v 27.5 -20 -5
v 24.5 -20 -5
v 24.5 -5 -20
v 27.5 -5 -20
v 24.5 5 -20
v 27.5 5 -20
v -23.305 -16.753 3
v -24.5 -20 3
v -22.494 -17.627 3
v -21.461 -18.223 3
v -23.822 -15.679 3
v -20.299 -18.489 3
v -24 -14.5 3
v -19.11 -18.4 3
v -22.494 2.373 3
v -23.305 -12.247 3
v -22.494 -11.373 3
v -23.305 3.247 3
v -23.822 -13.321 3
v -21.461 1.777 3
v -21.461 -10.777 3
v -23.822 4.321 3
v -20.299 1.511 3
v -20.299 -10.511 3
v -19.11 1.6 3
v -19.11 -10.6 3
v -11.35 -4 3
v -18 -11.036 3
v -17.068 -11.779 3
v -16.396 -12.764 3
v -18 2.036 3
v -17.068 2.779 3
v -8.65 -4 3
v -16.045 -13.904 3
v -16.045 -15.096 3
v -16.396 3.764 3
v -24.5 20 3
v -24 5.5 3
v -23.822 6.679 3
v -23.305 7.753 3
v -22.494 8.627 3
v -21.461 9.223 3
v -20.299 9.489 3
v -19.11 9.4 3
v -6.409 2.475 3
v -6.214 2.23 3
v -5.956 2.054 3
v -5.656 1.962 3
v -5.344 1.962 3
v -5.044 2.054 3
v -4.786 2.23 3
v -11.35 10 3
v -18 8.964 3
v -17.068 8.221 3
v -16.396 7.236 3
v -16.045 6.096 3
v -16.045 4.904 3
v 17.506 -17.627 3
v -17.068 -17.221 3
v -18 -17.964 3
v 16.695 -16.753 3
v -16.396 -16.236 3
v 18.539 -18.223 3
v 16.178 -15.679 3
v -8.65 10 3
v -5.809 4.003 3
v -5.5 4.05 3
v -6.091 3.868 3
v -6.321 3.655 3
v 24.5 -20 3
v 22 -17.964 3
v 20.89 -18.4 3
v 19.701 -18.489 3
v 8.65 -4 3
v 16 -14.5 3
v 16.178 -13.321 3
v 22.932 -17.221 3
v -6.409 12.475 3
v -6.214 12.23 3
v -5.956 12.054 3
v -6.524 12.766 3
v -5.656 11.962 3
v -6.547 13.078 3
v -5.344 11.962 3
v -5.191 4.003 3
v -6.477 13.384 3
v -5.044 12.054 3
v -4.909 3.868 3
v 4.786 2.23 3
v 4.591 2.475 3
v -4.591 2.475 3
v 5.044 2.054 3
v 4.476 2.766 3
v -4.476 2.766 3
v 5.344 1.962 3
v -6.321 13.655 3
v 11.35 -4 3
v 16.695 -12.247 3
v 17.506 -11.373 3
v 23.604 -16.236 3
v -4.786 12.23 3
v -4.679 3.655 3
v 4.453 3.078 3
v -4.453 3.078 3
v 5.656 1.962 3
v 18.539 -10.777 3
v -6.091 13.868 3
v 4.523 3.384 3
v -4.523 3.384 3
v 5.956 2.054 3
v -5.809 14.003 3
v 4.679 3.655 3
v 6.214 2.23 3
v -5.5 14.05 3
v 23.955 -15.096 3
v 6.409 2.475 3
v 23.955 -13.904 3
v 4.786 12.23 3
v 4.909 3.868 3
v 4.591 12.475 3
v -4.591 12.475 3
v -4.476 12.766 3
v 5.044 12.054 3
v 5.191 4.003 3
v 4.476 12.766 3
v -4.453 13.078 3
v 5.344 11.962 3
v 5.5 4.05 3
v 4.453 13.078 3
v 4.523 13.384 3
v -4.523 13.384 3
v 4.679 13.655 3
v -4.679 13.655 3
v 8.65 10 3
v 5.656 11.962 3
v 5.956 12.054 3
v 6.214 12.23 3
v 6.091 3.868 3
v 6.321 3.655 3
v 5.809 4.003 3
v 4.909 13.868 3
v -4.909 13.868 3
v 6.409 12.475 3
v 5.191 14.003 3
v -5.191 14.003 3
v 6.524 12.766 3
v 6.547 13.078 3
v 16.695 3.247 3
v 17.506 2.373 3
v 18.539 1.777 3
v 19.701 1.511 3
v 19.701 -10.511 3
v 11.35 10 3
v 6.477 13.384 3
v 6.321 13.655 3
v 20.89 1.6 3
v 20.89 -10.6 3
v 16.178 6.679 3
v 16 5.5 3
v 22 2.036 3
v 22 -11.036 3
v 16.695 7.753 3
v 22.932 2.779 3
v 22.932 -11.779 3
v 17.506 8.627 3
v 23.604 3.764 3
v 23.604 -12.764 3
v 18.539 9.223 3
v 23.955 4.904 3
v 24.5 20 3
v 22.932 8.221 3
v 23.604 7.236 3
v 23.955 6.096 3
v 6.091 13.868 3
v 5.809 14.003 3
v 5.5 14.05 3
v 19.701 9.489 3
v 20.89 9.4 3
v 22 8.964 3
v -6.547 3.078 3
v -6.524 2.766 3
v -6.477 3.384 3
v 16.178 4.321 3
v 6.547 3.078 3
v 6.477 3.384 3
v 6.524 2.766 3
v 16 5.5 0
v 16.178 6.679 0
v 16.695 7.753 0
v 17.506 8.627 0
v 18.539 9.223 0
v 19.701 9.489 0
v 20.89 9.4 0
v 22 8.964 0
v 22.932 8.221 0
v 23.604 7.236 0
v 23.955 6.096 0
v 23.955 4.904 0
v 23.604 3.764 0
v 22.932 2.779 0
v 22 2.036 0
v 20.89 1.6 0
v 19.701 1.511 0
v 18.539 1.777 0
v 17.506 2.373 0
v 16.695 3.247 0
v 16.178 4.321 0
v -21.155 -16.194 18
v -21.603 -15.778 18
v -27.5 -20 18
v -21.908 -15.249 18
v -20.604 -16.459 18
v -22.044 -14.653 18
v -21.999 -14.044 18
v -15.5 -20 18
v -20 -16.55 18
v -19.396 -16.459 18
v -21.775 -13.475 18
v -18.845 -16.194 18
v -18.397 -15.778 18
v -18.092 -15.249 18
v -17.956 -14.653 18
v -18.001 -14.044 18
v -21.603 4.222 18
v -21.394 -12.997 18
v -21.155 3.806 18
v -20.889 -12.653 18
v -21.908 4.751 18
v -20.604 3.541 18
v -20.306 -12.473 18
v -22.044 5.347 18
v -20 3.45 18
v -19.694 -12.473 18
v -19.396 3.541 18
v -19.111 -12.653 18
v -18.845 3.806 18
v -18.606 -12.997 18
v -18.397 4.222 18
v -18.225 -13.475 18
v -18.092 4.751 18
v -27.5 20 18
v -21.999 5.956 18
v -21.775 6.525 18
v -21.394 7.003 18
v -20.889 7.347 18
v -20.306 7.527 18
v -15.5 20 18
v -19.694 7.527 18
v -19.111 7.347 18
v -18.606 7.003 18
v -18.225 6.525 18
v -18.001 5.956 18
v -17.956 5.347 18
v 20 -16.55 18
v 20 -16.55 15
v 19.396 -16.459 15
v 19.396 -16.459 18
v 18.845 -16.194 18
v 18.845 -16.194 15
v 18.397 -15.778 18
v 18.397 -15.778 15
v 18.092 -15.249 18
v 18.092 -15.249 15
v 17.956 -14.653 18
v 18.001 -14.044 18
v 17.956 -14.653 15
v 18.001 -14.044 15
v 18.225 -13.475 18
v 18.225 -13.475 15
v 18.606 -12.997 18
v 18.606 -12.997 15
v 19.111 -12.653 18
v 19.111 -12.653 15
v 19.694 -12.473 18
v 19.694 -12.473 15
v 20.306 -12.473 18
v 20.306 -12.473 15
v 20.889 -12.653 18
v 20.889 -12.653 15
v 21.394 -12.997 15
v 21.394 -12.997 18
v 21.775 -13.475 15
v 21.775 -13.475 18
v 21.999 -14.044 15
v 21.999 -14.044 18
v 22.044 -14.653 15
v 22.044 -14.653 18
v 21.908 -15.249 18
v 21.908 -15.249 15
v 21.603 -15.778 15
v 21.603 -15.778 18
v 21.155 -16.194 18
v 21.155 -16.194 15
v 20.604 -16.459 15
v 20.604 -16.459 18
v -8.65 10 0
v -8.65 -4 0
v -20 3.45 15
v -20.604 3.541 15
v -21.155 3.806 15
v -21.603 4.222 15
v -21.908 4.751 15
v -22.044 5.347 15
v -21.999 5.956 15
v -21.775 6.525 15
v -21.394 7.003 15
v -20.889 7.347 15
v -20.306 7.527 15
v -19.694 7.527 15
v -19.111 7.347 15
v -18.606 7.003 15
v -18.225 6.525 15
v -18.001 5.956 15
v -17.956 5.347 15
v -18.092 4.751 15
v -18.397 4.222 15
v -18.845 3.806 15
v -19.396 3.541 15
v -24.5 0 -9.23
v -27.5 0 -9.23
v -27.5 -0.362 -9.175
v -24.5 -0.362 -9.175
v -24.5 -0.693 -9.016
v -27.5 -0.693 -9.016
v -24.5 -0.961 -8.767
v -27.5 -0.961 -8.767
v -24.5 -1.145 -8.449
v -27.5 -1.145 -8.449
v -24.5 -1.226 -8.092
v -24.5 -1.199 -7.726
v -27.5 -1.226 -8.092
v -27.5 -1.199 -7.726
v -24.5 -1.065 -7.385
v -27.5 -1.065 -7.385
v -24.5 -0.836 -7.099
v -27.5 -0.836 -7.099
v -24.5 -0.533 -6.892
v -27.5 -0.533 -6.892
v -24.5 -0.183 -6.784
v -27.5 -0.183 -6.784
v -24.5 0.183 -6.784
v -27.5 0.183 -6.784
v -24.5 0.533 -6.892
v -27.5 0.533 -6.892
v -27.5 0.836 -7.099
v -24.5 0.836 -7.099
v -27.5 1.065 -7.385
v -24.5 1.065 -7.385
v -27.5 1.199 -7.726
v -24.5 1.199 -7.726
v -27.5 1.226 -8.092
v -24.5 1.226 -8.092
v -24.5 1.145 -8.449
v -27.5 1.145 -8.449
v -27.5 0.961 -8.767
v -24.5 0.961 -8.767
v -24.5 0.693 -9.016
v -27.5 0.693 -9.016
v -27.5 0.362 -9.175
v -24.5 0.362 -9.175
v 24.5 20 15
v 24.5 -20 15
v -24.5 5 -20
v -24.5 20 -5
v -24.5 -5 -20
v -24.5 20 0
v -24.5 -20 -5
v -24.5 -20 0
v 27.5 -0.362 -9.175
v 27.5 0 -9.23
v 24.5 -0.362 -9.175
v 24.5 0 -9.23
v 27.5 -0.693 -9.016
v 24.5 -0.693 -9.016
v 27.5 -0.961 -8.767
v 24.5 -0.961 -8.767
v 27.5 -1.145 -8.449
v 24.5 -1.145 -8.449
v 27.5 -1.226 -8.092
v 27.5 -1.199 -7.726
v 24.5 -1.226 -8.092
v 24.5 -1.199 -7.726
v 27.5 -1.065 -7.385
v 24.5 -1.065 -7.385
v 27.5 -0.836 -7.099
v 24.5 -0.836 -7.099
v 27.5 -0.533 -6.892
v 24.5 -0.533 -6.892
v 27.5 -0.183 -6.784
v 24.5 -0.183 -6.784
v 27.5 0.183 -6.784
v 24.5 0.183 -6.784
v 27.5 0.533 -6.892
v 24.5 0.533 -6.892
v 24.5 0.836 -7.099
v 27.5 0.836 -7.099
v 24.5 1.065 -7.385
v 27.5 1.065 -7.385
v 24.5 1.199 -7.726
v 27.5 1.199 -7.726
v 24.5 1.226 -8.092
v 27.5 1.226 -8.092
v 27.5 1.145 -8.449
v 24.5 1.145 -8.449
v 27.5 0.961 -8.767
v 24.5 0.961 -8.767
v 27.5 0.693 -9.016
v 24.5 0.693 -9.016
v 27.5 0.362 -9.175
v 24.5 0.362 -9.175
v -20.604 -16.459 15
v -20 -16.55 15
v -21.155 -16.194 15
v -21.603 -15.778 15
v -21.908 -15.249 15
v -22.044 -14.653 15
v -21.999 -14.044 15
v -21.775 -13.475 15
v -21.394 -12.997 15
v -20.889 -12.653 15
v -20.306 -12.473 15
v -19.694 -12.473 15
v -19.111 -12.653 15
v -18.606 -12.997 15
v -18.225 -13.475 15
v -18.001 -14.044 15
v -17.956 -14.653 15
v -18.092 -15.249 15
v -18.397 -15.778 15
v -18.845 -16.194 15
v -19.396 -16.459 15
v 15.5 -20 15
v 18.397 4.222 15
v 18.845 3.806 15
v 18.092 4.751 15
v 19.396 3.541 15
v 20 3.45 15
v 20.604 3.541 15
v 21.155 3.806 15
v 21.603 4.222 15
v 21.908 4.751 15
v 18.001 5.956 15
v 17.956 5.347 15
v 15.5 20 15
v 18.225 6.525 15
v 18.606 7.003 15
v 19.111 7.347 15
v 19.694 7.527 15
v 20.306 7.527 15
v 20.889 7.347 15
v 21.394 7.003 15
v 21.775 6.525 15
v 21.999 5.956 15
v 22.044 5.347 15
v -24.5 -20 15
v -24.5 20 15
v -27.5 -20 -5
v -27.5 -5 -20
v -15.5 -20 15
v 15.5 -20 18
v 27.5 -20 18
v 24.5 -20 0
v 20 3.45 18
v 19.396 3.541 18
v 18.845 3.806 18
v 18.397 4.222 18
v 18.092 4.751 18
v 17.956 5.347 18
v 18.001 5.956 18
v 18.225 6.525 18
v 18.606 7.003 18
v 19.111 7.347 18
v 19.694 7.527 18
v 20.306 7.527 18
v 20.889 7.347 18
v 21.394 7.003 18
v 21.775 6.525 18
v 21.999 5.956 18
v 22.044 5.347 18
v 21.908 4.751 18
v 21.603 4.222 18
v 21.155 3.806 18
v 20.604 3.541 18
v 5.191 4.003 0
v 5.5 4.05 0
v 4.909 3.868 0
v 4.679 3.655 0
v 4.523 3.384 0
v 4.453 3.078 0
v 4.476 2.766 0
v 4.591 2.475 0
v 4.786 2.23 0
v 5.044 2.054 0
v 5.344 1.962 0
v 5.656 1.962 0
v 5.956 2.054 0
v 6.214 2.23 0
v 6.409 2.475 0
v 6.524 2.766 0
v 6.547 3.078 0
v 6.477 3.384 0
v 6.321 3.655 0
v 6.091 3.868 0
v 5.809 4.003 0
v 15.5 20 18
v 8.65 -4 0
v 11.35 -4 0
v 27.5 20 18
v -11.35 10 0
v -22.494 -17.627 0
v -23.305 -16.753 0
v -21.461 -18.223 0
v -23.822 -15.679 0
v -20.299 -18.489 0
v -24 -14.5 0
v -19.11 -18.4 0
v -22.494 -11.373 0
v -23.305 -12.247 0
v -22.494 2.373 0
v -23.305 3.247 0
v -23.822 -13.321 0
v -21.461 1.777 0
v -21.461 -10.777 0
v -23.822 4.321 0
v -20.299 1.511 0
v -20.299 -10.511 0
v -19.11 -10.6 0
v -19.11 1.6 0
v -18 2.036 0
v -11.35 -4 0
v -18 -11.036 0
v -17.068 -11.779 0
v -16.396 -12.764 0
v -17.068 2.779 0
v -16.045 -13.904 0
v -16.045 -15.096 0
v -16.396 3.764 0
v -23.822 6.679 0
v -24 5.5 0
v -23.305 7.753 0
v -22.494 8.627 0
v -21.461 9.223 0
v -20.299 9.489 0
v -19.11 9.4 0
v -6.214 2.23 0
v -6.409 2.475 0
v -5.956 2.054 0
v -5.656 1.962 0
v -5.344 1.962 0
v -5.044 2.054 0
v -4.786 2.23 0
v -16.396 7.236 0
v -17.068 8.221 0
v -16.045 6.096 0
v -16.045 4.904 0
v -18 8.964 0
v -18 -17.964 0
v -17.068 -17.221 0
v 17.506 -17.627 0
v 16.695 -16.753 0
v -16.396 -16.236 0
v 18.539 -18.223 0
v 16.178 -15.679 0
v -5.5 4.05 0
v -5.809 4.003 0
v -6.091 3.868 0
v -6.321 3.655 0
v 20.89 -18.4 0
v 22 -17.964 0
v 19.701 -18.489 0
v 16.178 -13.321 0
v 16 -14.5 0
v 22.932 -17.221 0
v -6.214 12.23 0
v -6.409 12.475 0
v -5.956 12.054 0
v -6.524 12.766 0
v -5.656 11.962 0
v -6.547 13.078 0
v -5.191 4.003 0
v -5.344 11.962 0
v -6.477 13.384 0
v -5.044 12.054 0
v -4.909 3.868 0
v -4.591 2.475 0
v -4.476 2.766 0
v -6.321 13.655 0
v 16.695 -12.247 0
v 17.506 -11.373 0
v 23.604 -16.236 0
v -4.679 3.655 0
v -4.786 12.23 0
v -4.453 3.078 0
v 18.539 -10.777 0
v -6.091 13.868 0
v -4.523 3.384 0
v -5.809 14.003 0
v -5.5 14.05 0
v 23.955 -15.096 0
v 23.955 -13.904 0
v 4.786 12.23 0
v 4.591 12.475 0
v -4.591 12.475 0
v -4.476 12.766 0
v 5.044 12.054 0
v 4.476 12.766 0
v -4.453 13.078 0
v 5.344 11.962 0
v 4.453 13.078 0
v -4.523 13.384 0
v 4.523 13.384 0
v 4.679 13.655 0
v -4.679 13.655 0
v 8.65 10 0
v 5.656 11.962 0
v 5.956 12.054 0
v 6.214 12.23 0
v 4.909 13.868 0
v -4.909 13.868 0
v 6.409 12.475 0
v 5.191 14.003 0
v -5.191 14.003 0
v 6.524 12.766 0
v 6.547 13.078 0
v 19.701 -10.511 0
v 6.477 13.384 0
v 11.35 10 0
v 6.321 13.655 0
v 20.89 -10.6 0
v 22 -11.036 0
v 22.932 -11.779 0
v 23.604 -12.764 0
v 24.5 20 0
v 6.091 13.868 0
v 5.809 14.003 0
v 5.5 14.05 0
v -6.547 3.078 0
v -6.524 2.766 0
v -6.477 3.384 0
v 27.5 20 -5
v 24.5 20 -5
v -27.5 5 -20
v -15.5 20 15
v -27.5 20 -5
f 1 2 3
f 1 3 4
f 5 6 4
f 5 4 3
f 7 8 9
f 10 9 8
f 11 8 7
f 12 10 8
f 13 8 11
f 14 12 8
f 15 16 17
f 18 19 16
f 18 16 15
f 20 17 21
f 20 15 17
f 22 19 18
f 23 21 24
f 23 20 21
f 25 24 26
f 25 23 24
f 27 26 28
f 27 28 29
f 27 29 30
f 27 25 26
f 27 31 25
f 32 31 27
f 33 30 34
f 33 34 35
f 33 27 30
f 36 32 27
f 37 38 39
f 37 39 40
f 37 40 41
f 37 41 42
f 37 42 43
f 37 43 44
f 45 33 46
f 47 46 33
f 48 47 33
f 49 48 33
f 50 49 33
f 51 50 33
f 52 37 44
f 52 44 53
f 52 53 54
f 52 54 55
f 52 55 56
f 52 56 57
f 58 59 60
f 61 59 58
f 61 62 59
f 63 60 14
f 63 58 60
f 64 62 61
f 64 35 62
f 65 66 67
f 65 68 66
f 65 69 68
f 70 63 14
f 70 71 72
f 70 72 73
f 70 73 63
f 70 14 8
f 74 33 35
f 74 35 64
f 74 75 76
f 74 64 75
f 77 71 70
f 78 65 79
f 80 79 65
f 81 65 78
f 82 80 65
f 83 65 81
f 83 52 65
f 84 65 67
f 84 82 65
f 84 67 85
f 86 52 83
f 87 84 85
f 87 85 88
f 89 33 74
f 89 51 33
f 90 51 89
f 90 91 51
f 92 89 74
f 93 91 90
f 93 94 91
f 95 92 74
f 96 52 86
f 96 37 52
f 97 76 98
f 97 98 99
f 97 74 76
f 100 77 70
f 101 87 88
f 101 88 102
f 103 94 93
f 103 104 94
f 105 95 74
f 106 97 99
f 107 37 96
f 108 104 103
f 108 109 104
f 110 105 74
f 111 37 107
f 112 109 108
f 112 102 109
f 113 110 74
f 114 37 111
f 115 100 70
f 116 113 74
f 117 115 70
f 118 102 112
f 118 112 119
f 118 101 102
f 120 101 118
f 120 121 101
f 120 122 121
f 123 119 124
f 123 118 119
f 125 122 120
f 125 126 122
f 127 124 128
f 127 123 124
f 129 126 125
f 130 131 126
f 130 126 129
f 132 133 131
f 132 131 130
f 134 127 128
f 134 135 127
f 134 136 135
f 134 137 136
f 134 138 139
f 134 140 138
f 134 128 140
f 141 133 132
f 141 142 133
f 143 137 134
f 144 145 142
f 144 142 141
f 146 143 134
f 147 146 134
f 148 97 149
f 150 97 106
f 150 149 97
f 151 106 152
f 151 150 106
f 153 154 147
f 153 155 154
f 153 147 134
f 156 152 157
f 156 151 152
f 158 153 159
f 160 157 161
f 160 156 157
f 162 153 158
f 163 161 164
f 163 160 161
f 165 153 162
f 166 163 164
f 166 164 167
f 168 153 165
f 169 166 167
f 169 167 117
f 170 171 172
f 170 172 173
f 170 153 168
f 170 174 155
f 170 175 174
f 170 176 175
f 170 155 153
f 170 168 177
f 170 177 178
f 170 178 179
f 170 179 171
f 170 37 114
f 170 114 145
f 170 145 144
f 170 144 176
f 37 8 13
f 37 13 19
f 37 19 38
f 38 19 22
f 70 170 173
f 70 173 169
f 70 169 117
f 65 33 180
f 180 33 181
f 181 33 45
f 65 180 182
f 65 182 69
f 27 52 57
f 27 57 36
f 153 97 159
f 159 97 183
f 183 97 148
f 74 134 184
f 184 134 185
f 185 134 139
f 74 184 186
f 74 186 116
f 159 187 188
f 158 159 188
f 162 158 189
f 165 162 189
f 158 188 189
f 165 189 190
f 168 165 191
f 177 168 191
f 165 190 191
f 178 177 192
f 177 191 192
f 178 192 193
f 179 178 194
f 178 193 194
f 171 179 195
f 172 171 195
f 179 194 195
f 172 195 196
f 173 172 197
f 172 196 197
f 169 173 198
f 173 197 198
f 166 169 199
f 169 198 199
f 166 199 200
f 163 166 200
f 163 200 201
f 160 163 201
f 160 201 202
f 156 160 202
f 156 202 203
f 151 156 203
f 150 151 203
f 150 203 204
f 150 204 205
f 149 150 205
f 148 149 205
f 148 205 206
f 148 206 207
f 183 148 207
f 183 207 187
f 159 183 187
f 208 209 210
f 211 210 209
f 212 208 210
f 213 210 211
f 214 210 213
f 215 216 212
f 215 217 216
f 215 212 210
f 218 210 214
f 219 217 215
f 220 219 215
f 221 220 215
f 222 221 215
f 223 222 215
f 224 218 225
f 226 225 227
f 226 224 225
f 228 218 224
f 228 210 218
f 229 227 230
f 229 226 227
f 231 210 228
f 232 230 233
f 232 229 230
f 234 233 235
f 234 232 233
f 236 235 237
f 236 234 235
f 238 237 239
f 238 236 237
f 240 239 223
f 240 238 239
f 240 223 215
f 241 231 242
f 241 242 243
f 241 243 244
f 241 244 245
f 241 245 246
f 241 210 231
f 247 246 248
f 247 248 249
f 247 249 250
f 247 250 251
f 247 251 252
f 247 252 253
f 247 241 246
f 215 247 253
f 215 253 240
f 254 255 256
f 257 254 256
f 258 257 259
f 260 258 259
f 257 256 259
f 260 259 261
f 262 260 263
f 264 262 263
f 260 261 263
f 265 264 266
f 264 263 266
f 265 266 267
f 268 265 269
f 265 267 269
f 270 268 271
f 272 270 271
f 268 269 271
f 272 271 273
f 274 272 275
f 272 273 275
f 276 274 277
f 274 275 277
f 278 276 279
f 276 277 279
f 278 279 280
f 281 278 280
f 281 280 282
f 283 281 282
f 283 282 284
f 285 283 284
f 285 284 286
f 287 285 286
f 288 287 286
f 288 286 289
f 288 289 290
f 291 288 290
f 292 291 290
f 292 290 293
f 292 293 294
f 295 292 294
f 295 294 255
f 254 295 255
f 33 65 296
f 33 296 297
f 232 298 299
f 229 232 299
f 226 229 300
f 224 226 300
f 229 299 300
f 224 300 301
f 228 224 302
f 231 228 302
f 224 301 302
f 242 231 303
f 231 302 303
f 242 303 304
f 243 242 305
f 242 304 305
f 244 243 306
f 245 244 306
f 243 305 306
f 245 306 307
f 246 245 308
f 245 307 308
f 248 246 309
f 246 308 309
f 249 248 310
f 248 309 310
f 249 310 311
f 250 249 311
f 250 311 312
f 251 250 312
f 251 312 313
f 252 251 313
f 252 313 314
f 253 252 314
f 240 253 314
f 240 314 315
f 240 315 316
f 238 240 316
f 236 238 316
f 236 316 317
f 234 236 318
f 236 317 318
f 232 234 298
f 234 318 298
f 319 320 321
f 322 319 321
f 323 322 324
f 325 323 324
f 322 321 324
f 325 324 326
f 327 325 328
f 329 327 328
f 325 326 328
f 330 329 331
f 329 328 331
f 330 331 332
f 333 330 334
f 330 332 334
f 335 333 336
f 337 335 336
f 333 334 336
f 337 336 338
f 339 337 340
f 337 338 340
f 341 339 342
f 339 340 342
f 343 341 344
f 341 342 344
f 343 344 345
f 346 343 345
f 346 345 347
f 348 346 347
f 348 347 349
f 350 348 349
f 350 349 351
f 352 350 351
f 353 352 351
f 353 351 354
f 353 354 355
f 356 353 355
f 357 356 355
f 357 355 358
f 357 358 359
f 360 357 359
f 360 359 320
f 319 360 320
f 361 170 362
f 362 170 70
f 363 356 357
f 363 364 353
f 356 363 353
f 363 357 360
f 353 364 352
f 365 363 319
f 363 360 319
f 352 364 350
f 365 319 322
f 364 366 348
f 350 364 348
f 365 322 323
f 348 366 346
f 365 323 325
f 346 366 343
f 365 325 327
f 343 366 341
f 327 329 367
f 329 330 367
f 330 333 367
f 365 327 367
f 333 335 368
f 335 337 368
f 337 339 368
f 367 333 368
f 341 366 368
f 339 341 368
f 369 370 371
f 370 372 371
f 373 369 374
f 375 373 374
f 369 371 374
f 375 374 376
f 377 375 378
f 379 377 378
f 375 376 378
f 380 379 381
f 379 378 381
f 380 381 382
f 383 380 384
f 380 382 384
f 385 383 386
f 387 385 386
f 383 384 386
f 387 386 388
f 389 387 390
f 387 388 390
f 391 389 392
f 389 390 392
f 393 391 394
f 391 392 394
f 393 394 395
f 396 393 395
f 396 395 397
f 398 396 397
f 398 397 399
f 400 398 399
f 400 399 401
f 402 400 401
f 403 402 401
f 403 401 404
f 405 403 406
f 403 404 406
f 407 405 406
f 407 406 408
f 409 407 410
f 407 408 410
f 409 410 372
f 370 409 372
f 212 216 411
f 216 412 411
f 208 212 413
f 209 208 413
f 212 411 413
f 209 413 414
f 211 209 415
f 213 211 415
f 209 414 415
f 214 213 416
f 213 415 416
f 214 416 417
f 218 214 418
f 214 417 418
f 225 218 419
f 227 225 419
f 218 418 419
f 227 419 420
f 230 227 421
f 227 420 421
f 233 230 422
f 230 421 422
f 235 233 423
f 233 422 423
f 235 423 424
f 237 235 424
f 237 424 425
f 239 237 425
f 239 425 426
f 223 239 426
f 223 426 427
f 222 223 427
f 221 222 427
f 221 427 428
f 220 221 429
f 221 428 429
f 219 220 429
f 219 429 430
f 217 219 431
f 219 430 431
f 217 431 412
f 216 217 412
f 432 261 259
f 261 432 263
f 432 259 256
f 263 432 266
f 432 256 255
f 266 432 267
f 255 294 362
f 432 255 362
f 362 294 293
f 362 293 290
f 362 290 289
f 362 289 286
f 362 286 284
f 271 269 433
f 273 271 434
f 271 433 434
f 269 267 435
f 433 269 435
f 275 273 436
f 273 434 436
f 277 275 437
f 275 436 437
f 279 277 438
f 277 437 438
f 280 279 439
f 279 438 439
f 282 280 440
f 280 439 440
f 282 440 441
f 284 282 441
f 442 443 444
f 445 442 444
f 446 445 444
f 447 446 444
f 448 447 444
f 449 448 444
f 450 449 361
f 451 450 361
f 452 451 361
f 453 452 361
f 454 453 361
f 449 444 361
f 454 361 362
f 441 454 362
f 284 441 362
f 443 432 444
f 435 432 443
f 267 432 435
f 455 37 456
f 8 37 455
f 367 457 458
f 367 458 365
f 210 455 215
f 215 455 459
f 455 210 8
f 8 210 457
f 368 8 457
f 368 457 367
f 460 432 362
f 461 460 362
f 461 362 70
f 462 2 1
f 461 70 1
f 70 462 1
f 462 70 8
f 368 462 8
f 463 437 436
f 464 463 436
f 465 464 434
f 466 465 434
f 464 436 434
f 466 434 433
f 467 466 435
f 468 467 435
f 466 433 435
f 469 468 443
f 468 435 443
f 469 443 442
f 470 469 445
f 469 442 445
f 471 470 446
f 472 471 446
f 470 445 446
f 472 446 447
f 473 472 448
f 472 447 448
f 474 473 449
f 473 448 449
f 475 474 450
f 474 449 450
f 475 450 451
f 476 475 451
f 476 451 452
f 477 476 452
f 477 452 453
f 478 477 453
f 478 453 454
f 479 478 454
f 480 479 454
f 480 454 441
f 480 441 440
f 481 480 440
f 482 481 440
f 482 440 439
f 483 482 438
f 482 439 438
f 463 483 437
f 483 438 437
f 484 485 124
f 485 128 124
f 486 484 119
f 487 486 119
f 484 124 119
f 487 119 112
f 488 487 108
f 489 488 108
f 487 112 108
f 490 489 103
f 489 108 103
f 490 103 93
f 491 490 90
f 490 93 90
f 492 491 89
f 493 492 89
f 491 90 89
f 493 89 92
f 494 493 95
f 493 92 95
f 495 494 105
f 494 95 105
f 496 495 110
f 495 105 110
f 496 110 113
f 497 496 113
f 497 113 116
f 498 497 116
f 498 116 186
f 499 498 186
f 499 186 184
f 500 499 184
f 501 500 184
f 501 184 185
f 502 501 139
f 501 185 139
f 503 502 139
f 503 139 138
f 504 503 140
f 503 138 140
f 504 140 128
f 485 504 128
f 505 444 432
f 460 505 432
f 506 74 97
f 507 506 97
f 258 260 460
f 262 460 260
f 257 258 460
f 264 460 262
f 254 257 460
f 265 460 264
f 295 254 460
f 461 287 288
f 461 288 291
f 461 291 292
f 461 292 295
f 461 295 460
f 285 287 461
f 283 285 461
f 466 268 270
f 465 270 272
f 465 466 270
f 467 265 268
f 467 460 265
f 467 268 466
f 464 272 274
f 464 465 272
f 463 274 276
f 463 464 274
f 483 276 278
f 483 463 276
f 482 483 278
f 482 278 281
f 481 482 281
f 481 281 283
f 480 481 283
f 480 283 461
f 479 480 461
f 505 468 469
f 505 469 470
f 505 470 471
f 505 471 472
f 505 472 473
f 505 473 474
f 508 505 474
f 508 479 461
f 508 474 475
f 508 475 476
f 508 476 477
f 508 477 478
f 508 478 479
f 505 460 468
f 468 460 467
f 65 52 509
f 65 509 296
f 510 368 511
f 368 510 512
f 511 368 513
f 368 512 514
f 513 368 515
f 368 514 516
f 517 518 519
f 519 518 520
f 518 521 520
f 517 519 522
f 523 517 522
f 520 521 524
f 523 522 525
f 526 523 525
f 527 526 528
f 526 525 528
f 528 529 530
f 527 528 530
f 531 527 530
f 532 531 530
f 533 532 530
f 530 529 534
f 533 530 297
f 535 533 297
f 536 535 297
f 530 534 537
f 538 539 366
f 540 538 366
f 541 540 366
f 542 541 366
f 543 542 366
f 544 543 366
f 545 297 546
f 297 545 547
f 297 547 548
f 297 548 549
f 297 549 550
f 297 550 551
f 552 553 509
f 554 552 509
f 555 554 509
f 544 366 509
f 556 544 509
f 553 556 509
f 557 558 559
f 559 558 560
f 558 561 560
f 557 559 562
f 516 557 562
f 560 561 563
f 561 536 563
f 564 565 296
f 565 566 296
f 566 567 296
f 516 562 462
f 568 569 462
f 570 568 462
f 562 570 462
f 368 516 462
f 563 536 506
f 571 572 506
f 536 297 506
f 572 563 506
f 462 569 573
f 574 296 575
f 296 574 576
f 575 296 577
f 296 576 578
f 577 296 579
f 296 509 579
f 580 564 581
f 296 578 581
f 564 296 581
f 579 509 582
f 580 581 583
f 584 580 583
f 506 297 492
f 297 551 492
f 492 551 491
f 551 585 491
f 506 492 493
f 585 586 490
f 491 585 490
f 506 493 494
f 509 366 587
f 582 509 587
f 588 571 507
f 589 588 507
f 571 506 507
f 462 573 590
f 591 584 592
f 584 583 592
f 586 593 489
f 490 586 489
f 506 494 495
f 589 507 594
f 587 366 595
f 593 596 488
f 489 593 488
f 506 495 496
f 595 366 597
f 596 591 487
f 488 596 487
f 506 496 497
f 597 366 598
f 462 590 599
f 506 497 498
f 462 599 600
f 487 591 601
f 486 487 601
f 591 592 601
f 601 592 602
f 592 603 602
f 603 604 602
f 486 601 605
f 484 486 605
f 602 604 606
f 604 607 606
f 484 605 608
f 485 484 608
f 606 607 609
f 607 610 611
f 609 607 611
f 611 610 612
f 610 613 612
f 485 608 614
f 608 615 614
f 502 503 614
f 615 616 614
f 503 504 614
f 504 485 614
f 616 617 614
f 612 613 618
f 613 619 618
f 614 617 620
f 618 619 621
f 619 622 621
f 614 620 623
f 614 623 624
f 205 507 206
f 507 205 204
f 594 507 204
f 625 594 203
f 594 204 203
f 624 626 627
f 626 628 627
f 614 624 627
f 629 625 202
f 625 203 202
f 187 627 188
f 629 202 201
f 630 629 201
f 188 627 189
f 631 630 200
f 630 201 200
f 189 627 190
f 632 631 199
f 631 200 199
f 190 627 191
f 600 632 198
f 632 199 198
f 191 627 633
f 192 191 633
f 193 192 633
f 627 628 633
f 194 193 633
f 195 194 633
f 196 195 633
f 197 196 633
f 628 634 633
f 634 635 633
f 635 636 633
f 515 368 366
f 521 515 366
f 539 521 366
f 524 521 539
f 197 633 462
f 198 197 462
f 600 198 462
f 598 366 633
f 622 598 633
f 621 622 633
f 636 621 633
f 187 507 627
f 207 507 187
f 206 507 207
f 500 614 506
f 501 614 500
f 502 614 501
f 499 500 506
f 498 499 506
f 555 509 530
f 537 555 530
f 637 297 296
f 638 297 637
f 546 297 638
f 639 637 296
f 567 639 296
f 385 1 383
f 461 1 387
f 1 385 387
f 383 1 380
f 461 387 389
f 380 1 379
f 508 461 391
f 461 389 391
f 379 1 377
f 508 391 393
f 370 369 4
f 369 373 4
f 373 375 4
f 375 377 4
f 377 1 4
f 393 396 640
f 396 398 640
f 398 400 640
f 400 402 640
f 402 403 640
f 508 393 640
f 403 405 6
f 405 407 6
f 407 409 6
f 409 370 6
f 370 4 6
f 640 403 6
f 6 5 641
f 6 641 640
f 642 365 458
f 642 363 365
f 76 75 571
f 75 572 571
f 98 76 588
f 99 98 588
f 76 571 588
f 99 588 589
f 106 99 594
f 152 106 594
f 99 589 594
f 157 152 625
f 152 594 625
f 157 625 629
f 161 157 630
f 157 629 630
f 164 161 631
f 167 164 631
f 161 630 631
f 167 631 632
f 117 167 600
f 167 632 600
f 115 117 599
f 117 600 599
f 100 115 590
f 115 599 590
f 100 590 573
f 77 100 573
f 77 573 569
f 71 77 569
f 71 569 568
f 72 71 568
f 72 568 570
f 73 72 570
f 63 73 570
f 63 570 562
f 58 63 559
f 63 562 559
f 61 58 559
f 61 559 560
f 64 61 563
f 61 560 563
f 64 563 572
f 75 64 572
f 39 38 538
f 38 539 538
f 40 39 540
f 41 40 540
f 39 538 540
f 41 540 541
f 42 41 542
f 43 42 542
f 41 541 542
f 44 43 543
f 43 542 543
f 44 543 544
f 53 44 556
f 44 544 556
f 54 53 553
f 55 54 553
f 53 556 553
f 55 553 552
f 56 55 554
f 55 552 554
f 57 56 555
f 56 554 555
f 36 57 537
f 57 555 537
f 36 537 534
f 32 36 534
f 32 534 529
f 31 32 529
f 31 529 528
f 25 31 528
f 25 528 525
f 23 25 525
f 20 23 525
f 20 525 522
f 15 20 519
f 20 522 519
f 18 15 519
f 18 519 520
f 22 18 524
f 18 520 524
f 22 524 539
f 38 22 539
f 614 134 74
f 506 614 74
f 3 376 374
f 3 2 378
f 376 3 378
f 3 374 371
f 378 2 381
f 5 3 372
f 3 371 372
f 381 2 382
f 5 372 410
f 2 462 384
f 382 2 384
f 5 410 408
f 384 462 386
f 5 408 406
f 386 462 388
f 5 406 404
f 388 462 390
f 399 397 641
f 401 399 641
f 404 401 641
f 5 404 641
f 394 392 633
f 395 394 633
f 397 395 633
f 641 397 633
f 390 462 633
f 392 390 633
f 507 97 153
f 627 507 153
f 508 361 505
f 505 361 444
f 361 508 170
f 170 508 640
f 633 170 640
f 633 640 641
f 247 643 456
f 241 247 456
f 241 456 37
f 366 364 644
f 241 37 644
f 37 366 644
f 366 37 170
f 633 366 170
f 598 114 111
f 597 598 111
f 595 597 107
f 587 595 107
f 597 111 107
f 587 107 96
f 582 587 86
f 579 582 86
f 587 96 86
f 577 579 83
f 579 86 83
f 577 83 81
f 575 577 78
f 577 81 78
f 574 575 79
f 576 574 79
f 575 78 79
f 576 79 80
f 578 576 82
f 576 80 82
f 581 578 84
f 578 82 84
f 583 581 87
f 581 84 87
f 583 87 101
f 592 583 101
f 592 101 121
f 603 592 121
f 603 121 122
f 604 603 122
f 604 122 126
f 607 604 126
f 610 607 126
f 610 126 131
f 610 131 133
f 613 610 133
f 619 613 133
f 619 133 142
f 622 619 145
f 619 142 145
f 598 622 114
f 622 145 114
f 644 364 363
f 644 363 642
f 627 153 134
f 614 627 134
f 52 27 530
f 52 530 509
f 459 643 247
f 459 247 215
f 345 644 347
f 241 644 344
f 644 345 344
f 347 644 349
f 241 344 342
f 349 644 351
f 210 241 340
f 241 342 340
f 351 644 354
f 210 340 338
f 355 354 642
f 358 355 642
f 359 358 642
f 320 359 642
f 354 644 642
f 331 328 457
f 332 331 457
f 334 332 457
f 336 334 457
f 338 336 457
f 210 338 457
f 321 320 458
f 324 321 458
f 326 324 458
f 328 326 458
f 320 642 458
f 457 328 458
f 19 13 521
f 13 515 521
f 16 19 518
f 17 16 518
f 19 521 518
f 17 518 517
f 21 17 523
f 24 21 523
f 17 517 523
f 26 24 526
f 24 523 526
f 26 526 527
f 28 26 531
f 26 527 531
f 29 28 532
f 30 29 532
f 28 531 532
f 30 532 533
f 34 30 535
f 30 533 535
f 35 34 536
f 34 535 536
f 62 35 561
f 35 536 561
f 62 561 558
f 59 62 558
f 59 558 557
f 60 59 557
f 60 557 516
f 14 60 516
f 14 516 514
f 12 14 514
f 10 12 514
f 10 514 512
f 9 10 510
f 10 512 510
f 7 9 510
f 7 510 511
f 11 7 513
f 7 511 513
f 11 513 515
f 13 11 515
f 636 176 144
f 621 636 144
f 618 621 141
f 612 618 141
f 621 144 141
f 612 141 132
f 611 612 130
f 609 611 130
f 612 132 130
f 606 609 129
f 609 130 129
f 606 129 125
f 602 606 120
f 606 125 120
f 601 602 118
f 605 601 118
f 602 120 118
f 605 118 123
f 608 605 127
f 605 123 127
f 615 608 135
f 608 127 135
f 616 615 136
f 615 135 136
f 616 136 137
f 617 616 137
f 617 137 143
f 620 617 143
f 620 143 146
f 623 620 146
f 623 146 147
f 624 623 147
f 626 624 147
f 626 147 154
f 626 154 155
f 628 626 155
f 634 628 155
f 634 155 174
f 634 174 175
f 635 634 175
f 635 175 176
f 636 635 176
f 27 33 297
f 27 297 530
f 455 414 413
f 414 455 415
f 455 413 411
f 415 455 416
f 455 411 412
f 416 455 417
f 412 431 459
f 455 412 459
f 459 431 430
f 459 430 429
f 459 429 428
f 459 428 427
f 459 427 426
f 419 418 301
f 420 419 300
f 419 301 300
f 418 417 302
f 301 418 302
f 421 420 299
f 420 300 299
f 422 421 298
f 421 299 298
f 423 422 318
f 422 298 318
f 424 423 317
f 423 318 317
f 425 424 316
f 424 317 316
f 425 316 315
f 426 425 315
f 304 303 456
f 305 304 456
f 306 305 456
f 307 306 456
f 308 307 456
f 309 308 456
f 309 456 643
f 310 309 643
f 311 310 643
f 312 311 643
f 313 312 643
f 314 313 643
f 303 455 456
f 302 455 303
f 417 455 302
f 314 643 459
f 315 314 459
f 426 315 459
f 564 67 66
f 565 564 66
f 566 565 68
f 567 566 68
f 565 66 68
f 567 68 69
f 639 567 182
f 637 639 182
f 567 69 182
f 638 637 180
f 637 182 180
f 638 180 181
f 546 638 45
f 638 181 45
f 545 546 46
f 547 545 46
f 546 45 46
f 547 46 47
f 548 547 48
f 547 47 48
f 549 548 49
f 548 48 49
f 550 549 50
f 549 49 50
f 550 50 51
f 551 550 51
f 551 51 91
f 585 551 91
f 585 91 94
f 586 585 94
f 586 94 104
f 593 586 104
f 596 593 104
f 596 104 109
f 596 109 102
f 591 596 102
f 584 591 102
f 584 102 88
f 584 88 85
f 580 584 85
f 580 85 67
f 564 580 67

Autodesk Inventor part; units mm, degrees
ref_plane "YZ Plane" through (0, 0, 0) normal (1, 0, 0) x (0, 1, 0)
ref_plane "XZ Plane" through (0, 0, 0) normal (0, 1, 0) x (-1, 0, 0)
ref_plane "XY Plane" through (0, 0, 0) normal (0, 0, 1) x (1, 0, 0)
sketch "Sketch1" plane through (0, 0, 0) normal (0, 0, 1) x (1, 0, 0)
  line L0 (27.5, 20) -> (-27.5, 20)
  line L1 (-27.5, 20) -> (-27.5, -20)
  line L2 (-27.5, -20) -> (27.5, -20)
  line L3 (27.5, -20) -> (27.5, 20)
  line L4 (27.5, 20) -> (-27.5, -20) construction
  line L5 (-27.5, 20) -> (27.5, -20) construction
  point P0 (0, 0)
  dimension "d0" = 55
  dimension "d1" = 40
extrude "Extrusion1" add sketch "Sketch1" along normal blind 3
sketch "Sketch2" plane through (0, 0, 3) normal (0, 0, 1) x (1, 0, 0)
  line L0 (27.5, 20) -> (-27.5, 20) projected
  line L1 (-27.5, 20) -> (-27.5, -20) projected
  line L2 (-27.5, -20) -> (27.5, -20) projected
  line L3 (27.5, -20) -> (27.5, 20) projected
  line L4 (-27.5, 20) -> (-24.5, 20)
  line L5 (-24.5, 20) -> (-24.5, -20)
  line L6 (-24.5, -20) -> (-27.5, -20)
  line L7 (-27.5, -20) -> (-27.5, 20)
  line L8 (27.5, 20) -> (24.5, 20)
  line L9 (24.5, 20) -> (24.5, -20)
  line L10 (24.5, -20) -> (27.5, -20)
  line L11 (27.5, -20) -> (27.5, 20)
  point P0 (0, 0)
  dimension "d4" = 3
  dimension "d5" = 3
extrude "Extrusion2" add sketch "Sketch2" along normal blind 12 contours L3 L2 L9 L0 | L5 L2 L1 L0
sketch "Sketch3" plane through (0, 0, 15) normal (0, 0, 1) x (1, 0, 0)
  line L0 (-27.5, 20) -> (-27.5, -20) projected
  line L1 (-27.5, -20) -> (-24.5, -20) projected
  line L2 (-24.5, -20) -> (-24.5, 20) projected
  line L3 (-24.5, 20) -> (-27.5, 20) projected
  line L4 (27.5, 20) -> (24.5, 20) projected
  line L5 (24.5, 20) -> (24.5, -20) projected
  line L6 (24.5, -20) -> (27.5, -20) projected
  line L7 (27.5, -20) -> (27.5, 20) projected
  line L8 (-27.5, -20) -> (27.5, -20) projected
  line L9 (-27.5, 20) -> (-15.5, 20)
  line L10 (-15.5, 20) -> (-15.5, -20)
  line L11 (-15.5, -20) -> (-27.5, -20)
  line L12 (-27.5, -20) -> (-27.5, 20)
  line L13 (27.5, 20) -> (15.5, 20)
  line L14 (15.5, 20) -> (15.5, -20)
  line L15 (15.5, -20) -> (27.5, -20)
  line L16 (27.5, -20) -> (27.5, 20)
  point P0 (0, 0)
  dimension "d8" = 12
  dimension "d9" = 12
extrude "Extrusion3" add sketch "Sketch3" along normal blind 3
sketch "Sketch4" plane through (0, 0, 18) normal (0, 0, 1) x (1, 0, 0)
  line L0 (-15.5, 20) -> (-27.5, 20) projected
  point P0 (0, 0)
  point P1 (-20, 5.5)
  point P2 (20, 5.5)
  point P3 (20, -14.5)
  point P4 (-20, -14.5)
  dimension "d12" = 40
  dimension "d13" = 20
  dimension "d14" = 14.5
  dimension "d15" = 20
hole "Hole1" at (-20, 5.5, 18) at (20, 5.5, 18) at (20, -14.5, 18) at (-20, -14.5, 18) direction (0, 0, -1) diameter 4.1 depth 8.8 tip angle 118
sketch "Sketch5" plane through (0, 0, 0) normal (0, 0, -1) x (-1, 0, 0)
  circle A0 centre (20, -14.5) radius 2.05 projected
  circle A1 centre (20, 5.5) radius 2.05 projected
  circle A2 centre (-20, 5.5) radius 2.05 projected
  circle A3 centre (-20, -14.5) radius 2.05 projected
  circle A4 centre (20, -14.5) radius 4
  circle A5 centre (-20, -14.5) radius 2.05 projected
  circle A6 centre (-20, -14.5) radius 4
  circle A7 centre (-20, 5.5) radius 4
  circle A8 centre (20, 5.5) radius 4
  point P0 (0, 0)
  dimension "d23" = 8
  dimension "d24" = 8
  dimension "d25" = 8
  dimension "d26" = 8
extrude "Extrusion4" cut sketch "Sketch5" against normal blind 3 contours A0 | A1 | A2 | A3 | A4 | A6 | A7 | A8
sketch "Sketch6" plane through (0, 0, 0) normal (0, 0, -1) x (-1, 0, 0)
  line L0 (-27.5, 20) -> (27.5, 20) projected
  point P0 (0, 0)
  point P1 (5.5, 3)
  point P2 (-5.5, 3)
  point P3 (-5.5, 13)
  point P4 (5.5, 13)
  dimension "d29" = 5.5
  dimension "d30" = 11
  dimension "d31" = 10
  dimension "d56" = 7
hole "Hole2" at (-5.5, 3, 0) at (5.5, 3, 0) at (5.5, 13, 0) at (-5.5, 13, 0) direction (0, 0, 1) diameter 2.1 depth 8.8 tip angle 118
sketch "Sketch8" plane through (0, 0, 0) normal (0, 0, -1) x (-1, 0, 0)
  line L0 (24.5, 20) -> (24.5, -20) projected
  line L1 (27.5, 20) -> (27.5, -20) projected
  line L2 (-24.5, -20) -> (-24.5, 20) projected
  line L3 (-27.5, -20) -> (-27.5, 20) projected
  line L4 (27.5, -20) -> (24.5, -20)
  line L5 (24.5, -20) -> (24.5, 20)
  line L6 (24.5, 20) -> (27.5, 20)
  line L7 (27.5, 20) -> (27.5, -20)
  line L8 (27.5, -20) -> (-27.5, -20) projected
  line L9 (-27.5, -20) -> (-24.5, -20)
  line L10 (-24.5, -20) -> (-24.5, 20)
  line L11 (-24.5, 20) -> (-27.5, 20)
  line L12 (-27.5, 20) -> (-27.5, -20)
  point P0 (0, 0)
extrude "Extrusion5" add sketch "Sketch8" along normal blind 20
sketch "Sketch9" plane through (27.5, -20, 18) normal (1, 0, 0) x (0, 0, -1)
  point P0 (18, 20)
chamfer "Chamfer1" distance 15 angle 45 1 edges at (26, -20, -20)
chamfer "Chamfer2" distance 15 angle 45 3 edges at (26, 20, -20) (-26, -20, -20) (-26, 20, -20)
sketch "Sketch11" plane through (27.5, -20, 18) normal (1, 0, 0) x (0, 0, -1)
  line L0 (38, 25) -> (38, 15) projected
  point P0 (18, 20)
  point P1 (26, 20)
  dimension "d48" = 12
hole "Hole3" at (27.5, 0, -8) direction (-1, 0, 0) diameter 2.459 end through all thread size "M3x0.5" class "6H" standard "ANSI Metric M Profile"
sketch "Sketch13" plane through (0, 0, 3) normal (0, 0, 1) x (1, 0, 0)
  line L0 (24.5, 20) -> (-24.5, 20) projected
  point P0 (0, 0)
  point P1 (-10, 1)
  point P2 (10, 1)
  dimension "d57" = 19
  dimension "d58" = 10
  dimension "d59" = 20
  dimension "d60" = 19
hole "Hole4" at (-10, 1, 3) at (10, 1, 3) direction (0, 0, -1) diameter 2.7 end through all
sketch "Sketch14" plane through (0, 0, 3) normal (0, 0, 1) x (1, 0, 0)
  line L0 (-8.65, -4) -> (-11.35, -4)
  line L1 (-11.35, -4) -> (-11.35, 10)
  line L2 (-11.35, 10) -> (-8.65, 10)
  line L3 (-8.65, 10) -> (-8.65, -4)
  line L4 (-8.65, -4) -> (-11.35, 10) construction
  line L5 (-11.35, -4) -> (-8.65, 10) construction
  line L6 (24.5, 20) -> (-24.5, 20) projected
  line L7 (11.35, 10) -> (8.65, 10)
  line L8 (8.65, 10) -> (8.65, -4)
  line L9 (8.65, -4) -> (11.35, -4)
  line L10 (11.35, -4) -> (11.35, 10)
  point P0 (0, 0)
  point P1 (-10, 3)
  point P2 (-10, 10)
  point P3 (10, 10)
  dimension "d68" = 2.7
  dimension "d69" = 10
  dimension "d70" = 7
  dimension "d71" = 10
  dimension "d72" = 2.7
  dimension "d73" = 10
  dimension "d74" = 14
  dimension "d75" = 10
extrude "Extrusion6" cut sketch "Sketch14" against normal through all
equation "\"d15\" = 0.5 * d12"
equation "\"d29\" = 0.5 * d30"
properties part number "attocube_holder" material "Koper"
